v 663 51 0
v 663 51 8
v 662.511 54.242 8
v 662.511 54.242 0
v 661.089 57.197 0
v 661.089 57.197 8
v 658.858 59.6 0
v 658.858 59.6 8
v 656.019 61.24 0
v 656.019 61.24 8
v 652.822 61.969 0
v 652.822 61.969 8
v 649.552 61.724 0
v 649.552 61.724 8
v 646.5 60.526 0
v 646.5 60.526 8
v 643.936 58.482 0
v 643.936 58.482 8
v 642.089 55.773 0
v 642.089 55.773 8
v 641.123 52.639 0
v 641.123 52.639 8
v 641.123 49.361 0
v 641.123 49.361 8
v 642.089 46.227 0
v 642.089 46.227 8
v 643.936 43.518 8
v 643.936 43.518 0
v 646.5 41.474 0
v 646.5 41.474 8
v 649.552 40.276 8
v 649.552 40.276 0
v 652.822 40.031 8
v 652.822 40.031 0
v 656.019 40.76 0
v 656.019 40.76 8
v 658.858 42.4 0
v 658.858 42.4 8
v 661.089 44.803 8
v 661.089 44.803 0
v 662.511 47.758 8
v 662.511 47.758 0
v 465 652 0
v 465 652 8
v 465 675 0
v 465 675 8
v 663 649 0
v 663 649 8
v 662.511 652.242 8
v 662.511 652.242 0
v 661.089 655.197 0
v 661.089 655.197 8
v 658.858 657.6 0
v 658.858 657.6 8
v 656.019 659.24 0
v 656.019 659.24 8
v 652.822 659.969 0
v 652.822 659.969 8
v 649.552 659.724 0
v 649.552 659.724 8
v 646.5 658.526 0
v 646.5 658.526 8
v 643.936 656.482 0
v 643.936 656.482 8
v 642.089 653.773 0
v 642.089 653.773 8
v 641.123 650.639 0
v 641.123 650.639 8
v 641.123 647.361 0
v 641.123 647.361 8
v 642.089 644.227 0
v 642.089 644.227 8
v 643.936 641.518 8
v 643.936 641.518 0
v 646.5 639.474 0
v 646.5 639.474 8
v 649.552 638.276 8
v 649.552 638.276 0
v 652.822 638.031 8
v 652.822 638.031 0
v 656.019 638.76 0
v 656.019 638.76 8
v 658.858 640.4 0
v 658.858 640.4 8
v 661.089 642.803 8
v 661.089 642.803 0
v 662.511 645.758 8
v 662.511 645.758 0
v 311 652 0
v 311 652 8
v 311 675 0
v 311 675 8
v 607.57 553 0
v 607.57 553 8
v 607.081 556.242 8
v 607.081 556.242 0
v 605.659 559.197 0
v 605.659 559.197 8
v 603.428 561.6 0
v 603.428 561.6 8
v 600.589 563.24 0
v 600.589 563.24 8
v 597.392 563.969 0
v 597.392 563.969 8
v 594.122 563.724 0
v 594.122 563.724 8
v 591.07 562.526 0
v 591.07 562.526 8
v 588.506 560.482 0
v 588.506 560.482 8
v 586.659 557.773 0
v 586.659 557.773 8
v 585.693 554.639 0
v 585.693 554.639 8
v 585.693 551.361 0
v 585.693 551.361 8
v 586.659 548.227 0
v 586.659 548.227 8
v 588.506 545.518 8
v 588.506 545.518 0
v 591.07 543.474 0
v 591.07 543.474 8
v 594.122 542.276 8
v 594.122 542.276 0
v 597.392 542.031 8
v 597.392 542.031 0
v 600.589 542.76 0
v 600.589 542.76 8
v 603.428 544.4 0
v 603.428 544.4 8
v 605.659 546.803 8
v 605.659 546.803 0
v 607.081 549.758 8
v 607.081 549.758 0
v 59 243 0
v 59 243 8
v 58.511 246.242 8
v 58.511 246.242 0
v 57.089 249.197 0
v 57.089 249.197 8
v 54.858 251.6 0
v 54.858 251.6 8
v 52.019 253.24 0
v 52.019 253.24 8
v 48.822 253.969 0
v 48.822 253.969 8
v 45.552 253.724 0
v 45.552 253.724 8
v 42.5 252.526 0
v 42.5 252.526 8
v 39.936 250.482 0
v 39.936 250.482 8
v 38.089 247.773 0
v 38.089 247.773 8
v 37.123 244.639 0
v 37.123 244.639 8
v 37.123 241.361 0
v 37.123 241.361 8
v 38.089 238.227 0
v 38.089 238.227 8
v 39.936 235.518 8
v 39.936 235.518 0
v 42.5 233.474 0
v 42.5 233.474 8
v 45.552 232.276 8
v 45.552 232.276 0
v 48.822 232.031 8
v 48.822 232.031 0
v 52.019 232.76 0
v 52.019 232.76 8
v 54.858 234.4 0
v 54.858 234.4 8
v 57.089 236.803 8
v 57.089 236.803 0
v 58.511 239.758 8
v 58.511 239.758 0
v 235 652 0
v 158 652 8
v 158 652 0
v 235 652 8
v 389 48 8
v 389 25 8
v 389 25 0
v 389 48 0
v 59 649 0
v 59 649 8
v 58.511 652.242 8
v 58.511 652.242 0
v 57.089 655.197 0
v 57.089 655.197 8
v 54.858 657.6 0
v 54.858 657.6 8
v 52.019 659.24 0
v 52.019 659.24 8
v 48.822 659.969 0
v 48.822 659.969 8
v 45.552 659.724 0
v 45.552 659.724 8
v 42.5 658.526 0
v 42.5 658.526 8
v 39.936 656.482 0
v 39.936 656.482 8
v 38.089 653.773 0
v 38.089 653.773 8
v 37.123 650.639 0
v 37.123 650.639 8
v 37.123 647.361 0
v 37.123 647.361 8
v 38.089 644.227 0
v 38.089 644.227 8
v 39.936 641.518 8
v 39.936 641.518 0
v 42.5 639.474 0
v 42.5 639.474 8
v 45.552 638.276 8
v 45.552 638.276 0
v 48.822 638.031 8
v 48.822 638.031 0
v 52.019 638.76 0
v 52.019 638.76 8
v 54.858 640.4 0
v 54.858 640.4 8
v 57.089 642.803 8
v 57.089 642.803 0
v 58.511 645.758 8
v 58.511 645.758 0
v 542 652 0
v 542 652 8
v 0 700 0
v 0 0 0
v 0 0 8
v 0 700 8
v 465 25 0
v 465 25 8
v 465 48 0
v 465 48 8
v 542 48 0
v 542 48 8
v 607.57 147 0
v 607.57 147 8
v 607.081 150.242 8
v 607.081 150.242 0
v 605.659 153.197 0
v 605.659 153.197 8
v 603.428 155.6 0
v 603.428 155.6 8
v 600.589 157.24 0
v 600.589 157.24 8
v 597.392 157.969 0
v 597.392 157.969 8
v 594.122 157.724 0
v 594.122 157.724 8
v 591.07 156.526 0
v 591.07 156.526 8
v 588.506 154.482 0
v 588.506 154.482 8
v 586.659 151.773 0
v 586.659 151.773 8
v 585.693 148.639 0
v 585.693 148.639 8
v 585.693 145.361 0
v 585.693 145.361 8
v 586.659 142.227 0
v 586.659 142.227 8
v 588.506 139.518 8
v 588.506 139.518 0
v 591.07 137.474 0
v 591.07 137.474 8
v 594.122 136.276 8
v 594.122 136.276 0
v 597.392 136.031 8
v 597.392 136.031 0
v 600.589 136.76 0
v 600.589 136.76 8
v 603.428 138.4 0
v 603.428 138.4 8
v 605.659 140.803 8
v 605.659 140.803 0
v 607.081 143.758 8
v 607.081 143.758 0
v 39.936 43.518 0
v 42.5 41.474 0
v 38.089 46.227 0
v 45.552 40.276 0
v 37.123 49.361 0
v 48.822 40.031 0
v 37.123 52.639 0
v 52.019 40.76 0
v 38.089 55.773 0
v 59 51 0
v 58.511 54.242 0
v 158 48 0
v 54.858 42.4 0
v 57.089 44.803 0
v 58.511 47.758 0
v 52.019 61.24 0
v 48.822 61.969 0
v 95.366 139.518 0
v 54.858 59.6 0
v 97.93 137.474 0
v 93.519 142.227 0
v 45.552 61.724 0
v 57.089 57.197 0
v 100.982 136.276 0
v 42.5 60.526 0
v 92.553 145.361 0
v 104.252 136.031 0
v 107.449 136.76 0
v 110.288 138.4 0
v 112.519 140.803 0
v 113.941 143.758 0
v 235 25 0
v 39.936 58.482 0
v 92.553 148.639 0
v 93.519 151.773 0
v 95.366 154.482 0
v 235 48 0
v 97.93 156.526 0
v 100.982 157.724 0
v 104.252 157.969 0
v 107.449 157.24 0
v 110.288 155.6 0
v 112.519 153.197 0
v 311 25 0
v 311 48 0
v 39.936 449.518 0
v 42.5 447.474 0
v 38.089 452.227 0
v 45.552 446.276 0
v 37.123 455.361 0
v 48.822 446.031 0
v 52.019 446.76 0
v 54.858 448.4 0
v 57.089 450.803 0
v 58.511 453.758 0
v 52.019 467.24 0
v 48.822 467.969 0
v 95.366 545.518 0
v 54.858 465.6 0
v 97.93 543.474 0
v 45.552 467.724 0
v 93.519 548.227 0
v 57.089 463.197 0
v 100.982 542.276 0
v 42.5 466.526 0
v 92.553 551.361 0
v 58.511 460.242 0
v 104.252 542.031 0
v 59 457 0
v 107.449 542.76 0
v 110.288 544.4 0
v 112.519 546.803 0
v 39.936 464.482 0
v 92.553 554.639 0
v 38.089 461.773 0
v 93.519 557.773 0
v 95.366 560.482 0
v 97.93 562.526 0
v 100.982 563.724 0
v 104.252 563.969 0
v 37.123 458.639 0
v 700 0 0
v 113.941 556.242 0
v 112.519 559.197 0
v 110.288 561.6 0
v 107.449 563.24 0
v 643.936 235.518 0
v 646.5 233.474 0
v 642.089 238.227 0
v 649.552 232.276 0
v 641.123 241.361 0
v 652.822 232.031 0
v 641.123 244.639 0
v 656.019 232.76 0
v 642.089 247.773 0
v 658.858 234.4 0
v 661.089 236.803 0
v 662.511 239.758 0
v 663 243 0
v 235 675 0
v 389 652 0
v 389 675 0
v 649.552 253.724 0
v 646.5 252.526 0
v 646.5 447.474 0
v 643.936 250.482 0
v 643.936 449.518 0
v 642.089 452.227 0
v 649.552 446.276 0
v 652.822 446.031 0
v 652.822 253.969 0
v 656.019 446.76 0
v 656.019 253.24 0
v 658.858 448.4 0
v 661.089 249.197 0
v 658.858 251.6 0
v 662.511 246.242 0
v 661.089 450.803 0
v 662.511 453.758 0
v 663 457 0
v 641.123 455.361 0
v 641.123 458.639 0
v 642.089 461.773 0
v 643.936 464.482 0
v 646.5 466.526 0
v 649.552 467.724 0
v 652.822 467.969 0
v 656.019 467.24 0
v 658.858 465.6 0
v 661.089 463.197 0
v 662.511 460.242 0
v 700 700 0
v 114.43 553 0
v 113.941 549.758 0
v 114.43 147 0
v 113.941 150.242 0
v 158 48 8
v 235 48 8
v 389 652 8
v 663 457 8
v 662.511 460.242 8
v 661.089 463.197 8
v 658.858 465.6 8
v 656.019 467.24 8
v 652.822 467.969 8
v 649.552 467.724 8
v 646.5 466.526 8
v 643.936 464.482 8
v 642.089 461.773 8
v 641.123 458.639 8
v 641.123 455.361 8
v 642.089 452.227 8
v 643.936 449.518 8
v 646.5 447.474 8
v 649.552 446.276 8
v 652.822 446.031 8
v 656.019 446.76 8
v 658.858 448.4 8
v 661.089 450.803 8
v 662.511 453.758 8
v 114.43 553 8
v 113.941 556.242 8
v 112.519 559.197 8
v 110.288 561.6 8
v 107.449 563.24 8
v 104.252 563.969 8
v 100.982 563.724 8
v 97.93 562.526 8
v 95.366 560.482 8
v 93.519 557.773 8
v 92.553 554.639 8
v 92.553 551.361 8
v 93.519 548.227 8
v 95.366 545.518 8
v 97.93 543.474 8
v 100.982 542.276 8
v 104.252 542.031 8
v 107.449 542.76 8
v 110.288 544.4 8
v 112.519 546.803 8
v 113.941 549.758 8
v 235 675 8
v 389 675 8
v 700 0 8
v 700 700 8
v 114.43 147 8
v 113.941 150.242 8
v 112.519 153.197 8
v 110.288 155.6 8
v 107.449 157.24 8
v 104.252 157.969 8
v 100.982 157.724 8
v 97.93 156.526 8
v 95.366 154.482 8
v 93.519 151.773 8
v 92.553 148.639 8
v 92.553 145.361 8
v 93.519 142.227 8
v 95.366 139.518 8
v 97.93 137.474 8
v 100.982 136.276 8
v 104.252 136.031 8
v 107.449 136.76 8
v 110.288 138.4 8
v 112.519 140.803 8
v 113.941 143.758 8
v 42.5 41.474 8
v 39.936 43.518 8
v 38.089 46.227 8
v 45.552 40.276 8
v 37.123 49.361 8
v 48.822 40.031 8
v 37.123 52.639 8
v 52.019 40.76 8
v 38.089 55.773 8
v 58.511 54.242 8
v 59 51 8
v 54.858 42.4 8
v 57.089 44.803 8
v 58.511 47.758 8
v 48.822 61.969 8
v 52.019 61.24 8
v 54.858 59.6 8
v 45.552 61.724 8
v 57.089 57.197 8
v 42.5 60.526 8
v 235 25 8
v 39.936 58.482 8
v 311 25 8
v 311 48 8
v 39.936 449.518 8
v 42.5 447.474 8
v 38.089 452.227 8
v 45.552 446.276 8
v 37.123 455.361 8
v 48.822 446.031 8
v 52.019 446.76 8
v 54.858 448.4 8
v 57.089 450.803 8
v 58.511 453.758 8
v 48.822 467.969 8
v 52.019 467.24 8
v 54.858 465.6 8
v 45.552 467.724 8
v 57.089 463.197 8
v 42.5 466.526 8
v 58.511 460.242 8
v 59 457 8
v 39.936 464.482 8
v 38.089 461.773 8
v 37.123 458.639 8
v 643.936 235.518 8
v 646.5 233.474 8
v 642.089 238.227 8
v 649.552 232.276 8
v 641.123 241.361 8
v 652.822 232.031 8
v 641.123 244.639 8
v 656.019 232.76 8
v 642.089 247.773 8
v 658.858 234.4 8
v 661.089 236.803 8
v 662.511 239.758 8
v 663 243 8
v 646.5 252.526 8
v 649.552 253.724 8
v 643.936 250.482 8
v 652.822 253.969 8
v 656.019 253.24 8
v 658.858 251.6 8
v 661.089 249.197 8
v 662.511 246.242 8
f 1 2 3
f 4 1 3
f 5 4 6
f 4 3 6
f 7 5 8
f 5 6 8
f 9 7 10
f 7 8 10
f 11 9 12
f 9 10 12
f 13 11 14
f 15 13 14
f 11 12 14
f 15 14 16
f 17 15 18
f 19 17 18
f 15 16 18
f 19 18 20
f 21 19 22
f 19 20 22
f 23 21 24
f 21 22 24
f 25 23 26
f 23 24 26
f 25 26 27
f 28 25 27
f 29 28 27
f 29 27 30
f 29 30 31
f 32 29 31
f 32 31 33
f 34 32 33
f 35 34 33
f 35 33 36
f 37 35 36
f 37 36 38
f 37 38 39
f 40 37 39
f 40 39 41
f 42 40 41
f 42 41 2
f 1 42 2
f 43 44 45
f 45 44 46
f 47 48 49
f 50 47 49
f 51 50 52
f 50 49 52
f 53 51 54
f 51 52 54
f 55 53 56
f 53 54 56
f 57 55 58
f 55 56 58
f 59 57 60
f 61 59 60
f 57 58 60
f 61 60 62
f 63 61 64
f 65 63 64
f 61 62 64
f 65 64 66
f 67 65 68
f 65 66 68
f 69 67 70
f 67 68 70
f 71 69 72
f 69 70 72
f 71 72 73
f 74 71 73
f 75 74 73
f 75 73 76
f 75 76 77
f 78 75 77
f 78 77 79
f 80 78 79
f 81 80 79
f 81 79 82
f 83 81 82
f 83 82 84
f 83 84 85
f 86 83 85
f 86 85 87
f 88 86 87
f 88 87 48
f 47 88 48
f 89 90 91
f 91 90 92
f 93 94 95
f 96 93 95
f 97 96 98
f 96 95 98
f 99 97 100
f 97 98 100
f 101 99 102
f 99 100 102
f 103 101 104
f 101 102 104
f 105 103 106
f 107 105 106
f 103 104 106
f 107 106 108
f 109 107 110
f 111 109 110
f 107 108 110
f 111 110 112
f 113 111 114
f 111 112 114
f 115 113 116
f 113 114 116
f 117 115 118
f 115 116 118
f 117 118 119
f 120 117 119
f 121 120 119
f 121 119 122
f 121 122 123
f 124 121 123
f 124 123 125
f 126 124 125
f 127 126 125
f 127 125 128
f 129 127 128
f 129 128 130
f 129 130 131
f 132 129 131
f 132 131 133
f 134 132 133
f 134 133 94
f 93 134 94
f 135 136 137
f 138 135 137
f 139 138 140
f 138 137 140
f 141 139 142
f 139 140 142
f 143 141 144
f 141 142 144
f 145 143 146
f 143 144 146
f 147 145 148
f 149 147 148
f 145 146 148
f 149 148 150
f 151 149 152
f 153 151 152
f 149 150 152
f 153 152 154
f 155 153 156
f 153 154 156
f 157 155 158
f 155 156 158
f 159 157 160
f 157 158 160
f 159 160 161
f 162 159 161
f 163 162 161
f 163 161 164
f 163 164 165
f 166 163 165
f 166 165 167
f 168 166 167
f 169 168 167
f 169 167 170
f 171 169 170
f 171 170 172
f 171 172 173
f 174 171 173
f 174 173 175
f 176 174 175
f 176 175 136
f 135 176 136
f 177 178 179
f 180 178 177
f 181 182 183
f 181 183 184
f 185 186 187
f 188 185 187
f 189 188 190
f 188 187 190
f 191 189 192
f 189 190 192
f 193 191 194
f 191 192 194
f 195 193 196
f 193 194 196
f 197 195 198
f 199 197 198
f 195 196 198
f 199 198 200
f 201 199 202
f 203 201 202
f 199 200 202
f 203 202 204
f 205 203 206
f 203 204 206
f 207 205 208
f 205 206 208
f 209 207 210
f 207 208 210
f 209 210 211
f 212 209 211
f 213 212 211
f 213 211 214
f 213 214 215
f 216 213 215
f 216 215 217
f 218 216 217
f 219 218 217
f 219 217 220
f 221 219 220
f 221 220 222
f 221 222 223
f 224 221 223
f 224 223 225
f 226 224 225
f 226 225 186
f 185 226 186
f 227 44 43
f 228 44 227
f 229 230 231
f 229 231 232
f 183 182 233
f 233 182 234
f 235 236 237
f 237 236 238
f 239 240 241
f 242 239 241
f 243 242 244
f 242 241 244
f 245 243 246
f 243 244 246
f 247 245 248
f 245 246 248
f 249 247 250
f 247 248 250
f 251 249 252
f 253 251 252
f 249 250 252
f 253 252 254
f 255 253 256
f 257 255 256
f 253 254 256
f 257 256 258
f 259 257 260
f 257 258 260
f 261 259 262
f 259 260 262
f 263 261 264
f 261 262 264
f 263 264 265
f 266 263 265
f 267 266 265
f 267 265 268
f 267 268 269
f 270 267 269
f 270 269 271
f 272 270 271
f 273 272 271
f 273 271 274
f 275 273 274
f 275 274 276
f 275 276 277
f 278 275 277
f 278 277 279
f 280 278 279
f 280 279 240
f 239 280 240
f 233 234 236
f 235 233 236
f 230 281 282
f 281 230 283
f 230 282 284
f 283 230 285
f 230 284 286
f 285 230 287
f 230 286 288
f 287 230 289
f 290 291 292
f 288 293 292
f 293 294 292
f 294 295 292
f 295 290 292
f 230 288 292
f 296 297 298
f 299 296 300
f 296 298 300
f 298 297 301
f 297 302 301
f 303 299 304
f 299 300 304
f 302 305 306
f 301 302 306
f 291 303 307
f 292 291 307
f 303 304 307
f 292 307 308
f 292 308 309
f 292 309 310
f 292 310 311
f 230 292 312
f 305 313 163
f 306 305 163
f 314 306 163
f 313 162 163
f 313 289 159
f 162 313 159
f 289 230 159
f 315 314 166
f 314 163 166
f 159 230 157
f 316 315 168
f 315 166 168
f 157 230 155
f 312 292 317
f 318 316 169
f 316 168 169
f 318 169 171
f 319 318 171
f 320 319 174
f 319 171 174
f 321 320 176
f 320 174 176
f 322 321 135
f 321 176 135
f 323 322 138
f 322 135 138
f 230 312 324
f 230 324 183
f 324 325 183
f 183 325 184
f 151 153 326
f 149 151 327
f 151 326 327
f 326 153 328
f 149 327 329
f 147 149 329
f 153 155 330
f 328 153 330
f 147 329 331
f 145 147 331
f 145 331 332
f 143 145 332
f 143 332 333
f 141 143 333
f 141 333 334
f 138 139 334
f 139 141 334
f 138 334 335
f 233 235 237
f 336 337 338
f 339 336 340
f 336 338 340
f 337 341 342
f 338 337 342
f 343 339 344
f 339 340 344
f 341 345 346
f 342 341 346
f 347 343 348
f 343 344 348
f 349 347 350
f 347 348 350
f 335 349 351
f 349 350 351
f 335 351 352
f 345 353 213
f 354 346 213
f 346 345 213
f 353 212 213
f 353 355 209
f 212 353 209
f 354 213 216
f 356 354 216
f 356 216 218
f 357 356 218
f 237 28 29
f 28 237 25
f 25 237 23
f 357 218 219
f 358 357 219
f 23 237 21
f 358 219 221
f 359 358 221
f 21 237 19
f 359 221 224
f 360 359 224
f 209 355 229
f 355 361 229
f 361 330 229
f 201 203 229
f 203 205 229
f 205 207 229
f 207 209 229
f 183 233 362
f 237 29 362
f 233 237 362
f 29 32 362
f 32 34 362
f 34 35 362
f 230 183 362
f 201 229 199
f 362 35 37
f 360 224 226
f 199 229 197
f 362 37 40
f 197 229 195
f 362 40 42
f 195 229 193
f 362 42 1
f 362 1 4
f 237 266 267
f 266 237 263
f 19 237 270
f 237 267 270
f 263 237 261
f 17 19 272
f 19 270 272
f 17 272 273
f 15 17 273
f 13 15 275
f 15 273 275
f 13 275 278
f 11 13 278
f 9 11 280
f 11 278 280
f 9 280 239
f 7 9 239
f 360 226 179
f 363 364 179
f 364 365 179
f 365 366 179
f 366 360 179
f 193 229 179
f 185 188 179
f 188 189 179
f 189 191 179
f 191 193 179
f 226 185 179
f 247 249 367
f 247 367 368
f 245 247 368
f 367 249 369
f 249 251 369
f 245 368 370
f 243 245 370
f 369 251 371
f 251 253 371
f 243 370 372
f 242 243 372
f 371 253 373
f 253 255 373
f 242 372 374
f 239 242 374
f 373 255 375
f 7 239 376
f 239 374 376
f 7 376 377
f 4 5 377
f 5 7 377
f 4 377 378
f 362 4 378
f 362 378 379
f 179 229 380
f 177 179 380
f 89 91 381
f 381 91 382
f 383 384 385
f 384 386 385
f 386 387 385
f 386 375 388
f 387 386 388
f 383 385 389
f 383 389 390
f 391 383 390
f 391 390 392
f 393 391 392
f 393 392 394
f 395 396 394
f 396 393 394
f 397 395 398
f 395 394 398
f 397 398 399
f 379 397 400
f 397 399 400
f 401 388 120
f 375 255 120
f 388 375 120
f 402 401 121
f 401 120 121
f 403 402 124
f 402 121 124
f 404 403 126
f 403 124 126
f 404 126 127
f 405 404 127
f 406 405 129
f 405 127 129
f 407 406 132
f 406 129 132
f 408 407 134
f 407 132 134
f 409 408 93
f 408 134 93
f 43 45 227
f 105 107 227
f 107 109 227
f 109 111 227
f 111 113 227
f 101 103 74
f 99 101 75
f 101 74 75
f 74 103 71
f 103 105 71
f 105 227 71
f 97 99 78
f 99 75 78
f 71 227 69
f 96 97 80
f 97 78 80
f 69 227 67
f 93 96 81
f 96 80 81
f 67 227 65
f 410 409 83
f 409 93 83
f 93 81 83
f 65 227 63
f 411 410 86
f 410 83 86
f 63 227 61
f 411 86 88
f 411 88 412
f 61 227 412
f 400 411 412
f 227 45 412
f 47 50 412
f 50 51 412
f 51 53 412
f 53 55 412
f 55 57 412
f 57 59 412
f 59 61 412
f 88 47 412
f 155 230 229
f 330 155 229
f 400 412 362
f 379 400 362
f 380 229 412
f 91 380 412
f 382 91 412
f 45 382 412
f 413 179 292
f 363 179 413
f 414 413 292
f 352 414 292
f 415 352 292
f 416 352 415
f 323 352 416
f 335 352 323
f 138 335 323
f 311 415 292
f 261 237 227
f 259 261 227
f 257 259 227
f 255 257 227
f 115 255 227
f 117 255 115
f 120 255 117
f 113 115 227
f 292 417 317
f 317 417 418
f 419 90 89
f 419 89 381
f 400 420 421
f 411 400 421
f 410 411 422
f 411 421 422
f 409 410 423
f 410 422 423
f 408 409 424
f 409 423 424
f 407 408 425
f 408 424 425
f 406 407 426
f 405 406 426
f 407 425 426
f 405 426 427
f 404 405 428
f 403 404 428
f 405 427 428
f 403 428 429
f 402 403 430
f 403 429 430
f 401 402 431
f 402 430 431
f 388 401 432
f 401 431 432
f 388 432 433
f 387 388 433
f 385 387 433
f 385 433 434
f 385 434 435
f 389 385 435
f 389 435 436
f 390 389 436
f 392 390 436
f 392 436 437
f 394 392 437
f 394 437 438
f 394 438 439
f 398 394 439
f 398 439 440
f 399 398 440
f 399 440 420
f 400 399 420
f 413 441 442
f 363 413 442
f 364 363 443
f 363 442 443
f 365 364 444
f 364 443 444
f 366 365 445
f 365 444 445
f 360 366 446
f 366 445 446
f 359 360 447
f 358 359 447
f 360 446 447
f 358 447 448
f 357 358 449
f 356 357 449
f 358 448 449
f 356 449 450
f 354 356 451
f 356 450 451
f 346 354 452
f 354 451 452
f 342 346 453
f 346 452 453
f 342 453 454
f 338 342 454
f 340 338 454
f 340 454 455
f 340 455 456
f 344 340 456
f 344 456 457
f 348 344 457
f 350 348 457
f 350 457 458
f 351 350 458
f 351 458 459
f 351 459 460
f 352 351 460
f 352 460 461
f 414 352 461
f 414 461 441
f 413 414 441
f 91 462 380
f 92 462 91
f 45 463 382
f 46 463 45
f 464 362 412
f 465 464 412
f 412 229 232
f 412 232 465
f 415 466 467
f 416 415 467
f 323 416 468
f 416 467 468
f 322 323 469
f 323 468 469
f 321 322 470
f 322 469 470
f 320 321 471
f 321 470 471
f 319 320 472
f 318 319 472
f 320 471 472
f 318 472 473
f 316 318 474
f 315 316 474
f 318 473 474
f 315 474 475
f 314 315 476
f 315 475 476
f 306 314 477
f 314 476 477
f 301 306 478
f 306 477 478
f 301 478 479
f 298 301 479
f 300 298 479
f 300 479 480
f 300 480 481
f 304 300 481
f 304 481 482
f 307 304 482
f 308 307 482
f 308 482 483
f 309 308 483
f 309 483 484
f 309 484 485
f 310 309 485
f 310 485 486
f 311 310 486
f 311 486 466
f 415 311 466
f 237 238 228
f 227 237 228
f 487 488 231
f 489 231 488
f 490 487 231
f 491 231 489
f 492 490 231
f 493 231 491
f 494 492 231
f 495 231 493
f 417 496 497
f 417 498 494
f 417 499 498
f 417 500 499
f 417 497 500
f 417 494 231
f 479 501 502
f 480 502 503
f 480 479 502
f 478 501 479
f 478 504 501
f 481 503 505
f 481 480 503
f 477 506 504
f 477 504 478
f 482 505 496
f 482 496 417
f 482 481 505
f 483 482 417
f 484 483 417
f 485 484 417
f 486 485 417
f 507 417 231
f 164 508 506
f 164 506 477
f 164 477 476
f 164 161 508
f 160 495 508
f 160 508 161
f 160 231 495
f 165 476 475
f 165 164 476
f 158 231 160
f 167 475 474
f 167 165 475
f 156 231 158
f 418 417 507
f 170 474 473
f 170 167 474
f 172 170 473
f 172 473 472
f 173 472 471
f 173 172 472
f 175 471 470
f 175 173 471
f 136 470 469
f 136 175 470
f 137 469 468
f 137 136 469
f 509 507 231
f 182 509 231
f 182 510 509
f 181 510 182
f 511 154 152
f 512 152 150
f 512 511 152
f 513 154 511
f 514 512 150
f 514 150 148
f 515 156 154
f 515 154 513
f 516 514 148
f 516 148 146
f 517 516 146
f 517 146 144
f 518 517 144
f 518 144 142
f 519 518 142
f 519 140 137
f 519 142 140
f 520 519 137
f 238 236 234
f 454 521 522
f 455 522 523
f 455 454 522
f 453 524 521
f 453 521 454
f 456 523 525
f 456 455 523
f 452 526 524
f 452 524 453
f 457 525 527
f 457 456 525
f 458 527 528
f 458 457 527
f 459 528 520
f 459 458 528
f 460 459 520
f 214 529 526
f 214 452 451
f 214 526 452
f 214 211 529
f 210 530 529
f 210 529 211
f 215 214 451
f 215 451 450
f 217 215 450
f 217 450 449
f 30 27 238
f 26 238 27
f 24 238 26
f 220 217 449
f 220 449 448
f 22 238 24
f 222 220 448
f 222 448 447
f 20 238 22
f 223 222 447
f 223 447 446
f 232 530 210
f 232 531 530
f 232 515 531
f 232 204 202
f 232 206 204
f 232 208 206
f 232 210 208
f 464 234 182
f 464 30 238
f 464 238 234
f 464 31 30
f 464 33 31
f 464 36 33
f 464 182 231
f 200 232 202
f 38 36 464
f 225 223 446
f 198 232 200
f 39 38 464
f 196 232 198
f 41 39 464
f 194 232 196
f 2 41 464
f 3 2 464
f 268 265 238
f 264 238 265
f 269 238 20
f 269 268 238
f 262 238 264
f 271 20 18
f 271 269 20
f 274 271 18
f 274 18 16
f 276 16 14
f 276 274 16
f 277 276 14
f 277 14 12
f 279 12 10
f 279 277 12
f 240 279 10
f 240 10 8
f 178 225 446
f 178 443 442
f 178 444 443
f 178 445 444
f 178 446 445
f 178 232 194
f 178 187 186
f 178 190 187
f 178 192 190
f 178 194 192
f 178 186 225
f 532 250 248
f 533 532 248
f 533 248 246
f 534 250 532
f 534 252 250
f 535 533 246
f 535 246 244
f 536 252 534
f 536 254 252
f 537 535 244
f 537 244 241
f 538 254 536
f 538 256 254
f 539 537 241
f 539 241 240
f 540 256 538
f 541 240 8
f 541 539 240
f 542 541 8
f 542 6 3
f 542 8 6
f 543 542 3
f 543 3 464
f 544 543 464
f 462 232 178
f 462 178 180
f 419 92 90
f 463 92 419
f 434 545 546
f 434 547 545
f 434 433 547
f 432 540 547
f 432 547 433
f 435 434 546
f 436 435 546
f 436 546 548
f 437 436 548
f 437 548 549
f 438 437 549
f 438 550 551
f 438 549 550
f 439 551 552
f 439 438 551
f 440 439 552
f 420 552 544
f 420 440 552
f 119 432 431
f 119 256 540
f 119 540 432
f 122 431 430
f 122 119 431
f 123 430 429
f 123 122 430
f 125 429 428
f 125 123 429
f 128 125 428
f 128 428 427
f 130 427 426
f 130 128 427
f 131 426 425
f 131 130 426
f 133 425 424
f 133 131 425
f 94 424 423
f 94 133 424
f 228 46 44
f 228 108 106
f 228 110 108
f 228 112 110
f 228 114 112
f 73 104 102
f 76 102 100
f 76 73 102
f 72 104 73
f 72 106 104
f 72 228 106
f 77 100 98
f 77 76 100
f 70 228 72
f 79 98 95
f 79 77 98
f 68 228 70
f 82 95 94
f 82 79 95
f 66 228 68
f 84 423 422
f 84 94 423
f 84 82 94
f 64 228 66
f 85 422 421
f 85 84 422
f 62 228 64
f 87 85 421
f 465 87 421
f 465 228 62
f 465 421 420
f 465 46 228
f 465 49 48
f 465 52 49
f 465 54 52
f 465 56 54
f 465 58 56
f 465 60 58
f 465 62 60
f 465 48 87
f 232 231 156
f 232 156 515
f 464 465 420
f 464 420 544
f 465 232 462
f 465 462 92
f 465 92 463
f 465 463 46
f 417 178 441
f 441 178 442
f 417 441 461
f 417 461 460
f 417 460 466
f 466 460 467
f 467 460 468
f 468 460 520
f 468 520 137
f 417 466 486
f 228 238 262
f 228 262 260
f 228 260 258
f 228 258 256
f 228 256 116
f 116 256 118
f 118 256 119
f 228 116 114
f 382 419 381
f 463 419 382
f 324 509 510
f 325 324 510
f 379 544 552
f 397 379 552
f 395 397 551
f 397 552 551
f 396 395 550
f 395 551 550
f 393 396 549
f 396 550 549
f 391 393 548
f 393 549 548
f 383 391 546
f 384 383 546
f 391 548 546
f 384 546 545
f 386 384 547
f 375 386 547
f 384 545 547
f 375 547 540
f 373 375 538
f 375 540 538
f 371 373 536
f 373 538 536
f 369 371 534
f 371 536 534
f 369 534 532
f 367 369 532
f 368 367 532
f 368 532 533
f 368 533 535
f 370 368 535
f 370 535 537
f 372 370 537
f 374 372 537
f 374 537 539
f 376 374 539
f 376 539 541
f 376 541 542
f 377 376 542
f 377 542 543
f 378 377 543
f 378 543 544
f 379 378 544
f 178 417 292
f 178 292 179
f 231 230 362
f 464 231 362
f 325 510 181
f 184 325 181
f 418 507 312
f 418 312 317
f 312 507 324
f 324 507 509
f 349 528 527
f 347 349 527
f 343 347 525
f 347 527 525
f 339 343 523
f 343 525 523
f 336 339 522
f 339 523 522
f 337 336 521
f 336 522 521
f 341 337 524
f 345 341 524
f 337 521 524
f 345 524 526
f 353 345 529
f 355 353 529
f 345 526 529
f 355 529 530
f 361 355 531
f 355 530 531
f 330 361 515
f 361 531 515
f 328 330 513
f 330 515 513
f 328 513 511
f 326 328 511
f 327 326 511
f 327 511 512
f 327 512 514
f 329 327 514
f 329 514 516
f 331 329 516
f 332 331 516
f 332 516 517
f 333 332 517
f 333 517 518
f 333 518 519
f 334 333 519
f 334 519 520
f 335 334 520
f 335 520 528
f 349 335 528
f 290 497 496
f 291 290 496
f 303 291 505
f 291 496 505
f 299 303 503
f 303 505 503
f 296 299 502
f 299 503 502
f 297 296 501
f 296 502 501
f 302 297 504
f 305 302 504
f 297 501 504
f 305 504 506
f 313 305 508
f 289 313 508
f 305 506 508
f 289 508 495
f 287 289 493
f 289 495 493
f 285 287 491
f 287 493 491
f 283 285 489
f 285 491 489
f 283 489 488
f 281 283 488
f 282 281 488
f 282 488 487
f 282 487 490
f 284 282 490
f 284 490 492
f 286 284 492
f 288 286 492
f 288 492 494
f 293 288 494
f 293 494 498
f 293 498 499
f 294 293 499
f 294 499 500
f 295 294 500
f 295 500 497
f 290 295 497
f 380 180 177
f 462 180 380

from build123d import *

# Parameters (mm, degrees)
SKETCH_1_W                      = 700
SKETCH_1_H                      = 700
CONNECTION_PLATE_DEPTH          = 8
SKETCH_2_W                      = 76
SKETCH_2_H                      = 300
ACCESS_WINDOW_DEPTH             = 990.981818015
SKETCH_3_W                      = 76
SKETCH_3_H                      = 300
CUT_EXTRUDE_2_DEPTH             = 990.981818015
SKETCH_4_W                      = 76
SKETCH_4_H                      = 300
CUT_EXTRUDE_3_DEPTH             = 990.981818015
SKETCH_5_W                      = 76
SKETCH_5_H                      = 300
CUT_EXTRUDE_4_DEPTH             = 990.981818015
SKETCH_6_R                      = 11
SHAFT_CLEARANCE_DEPTH           = 990.981818015
SKETCH_7_R                      = 11
CUT_EXTRUDE_6_DEPTH             = 990.981818015
SKETCH_8_R                      = 11
CUT_EXTRUDE_7_DEPTH             = 990.981818015
SKETCH_9_R                      = 11
CUT_EXTRUDE_8_DEPTH             = 990.981818015
SKETCH_10_R                     = 11
CUT_EXTRUDE_9_DEPTH             = 990.981818015
SKETCH_11_R                     = 11
CUT_EXTRUDE_10_DEPTH            = 990.981818015
SKETCH_12_R                     = 11
CUT_EXTRUDE_11_DEPTH            = 990.981818015
SKETCH_13_R                     = 11
CUT_EXTRUDE_12_DEPTH            = 990.981818015
SKETCH_14_R                     = 11
CUT_EXTRUDE_13_DEPTH            = 990.981818015
SKETCH_15_R                     = 11
CUT_EXTRUDE_14_DEPTH            = 990.981818015
SKETCH_16_R                     = 11
CUT_EXTRUDE_15_DEPTH            = 990.981818015
SKETCH_17_R                     = 11
CUT_EXTRUDE_16_DEPTH            = 990.981818015
SKETCH_18_W                     = 384
SKETCH_18_H                     = 604
FLOAT_INSTALLATION_WINDOW_DEPTH = 990.981818015


with BuildPart() as part:
    # 草图1 → Connection_plate (new body)
    with BuildSketch(Plane.XY):
        with Locations((350, 350)):
            Rectangle(SKETCH_1_W, SKETCH_1_H)
    extrude(amount=CONNECTION_PLATE_DEPTH)

    # 草图2 → Access_window (cut, through all)
    with BuildSketch(Plane.XY.offset(8)):
        with Locations((273, 175)):
            Rectangle(SKETCH_2_W, SKETCH_2_H)
    extrude(amount=-ACCESS_WINDOW_DEPTH, mode=Mode.SUBTRACT)

    # 草图3 → 切除-拉伸2 (cut, through all)
    with BuildSketch(Plane.XY.offset(8)):
        with Locations((273, 525)):
            Rectangle(SKETCH_3_W, SKETCH_3_H)
    extrude(amount=-CUT_EXTRUDE_2_DEPTH, mode=Mode.SUBTRACT)

    # 草图4 → 切除-拉伸3 (cut, through all)
    with BuildSketch(Plane.XY.offset(8)):
        with Locations((427, 175)):
            Rectangle(SKETCH_4_W, SKETCH_4_H)
    extrude(amount=-CUT_EXTRUDE_3_DEPTH, mode=Mode.SUBTRACT)

    # 草图5 → 切除-拉伸4 (cut, through all)
    with BuildSketch(Plane.XY.offset(8)):
        with Locations((427, 525)):
            Rectangle(SKETCH_5_W, SKETCH_5_H)
    extrude(amount=-CUT_EXTRUDE_4_DEPTH, mode=Mode.SUBTRACT)

    # 草图6 → Shaft_clearance (cut, through all)
    with BuildSketch(Plane.XY.offset(8)):
        with Locations((48, 51)):
            Circle(SKETCH_6_R)
    extrude(amount=-SHAFT_CLEARANCE_DEPTH, mode=Mode.SUBTRACT)

    # 草图7 → 切除-拉伸6 (cut, through all)
    with BuildSketch(Plane.XY.offset(8)):
        with Locations((48, 243)):
            Circle(SKETCH_7_R)
    extrude(amount=-CUT_EXTRUDE_6_DEPTH, mode=Mode.SUBTRACT)

    # 草图8 → 切除-拉伸7 (cut, through all)
    with BuildSketch(Plane.XY.offset(8)):
        with Locations((48, 457)):
            Circle(SKETCH_8_R)
    extrude(amount=-CUT_EXTRUDE_7_DEPTH, mode=Mode.SUBTRACT)

    # 草图9 → 切除-拉伸8 (cut, through all)
    with BuildSketch(Plane.XY.offset(8)):
        with Locations((48, 649)):
            Circle(SKETCH_9_R)
    extrude(amount=-CUT_EXTRUDE_8_DEPTH, mode=Mode.SUBTRACT)

    # 草图10 → 切除-拉伸9 (cut, through all)
    with BuildSketch(Plane.XY.offset(8)):
        with Locations((103.43, 147)):
            Circle(SKETCH_10_R)
    extrude(amount=-CUT_EXTRUDE_9_DEPTH, mode=Mode.SUBTRACT)

    # 草图11 → 切除-拉伸10 (cut, through all)
    with BuildSketch(Plane.XY.offset(8)):
        with Locations((103.43, 553)):
            Circle(SKETCH_11_R)
    extrude(amount=-CUT_EXTRUDE_10_DEPTH, mode=Mode.SUBTRACT)

    # 草图12 → 切除-拉伸11 (cut, through all)
    with BuildSketch(Plane.XY.offset(8)):
        with Locations((652, 51)):
            Circle(SKETCH_12_R)
    extrude(amount=-CUT_EXTRUDE_11_DEPTH, mode=Mode.SUBTRACT)

    # 草图13 → 切除-拉伸12 (cut, through all)
    with BuildSketch(Plane.XY.offset(8)):
        with Locations((652, 243)):
            Circle(SKETCH_13_R)
    extrude(amount=-CUT_EXTRUDE_12_DEPTH, mode=Mode.SUBTRACT)

    # 草图14 → 切除-拉伸13 (cut, through all)
    with BuildSketch(Plane.XY.offset(8)):
        with Locations((652, 457)):
            Circle(SKETCH_14_R)
    extrude(amount=-CUT_EXTRUDE_13_DEPTH, mode=Mode.SUBTRACT)

    # 草图15 → 切除-拉伸14 (cut, through all)
    with BuildSketch(Plane.XY.offset(8)):
        with Locations((652, 649)):
            Circle(SKETCH_15_R)
    extrude(amount=-CUT_EXTRUDE_14_DEPTH, mode=Mode.SUBTRACT)

    # 草图16 → 切除-拉伸15 (cut, through all)
    with BuildSketch(Plane.XY.offset(8)):
        with Locations((596.57, 147)):
            Circle(SKETCH_16_R)
    extrude(amount=-CUT_EXTRUDE_15_DEPTH, mode=Mode.SUBTRACT)

    # 草图17 → 切除-拉伸16 (cut, through all)
    with BuildSketch(Plane.XY.offset(8)):
        with Locations((596.57, 553)):
            Circle(SKETCH_17_R)
    extrude(amount=-CUT_EXTRUDE_16_DEPTH, mode=Mode.SUBTRACT)

    # 草图18 → Float_installation_window (cut, through all)
    with BuildSketch(Plane.XY.offset(8)):
        with Locations((350, 350)):
            Rectangle(SKETCH_18_W, SKETCH_18_H)
    extrude(amount=-FLOAT_INSTALLATION_WINDOW_DEPTH, mode=Mode.SUBTRACT)


solid = part.part
